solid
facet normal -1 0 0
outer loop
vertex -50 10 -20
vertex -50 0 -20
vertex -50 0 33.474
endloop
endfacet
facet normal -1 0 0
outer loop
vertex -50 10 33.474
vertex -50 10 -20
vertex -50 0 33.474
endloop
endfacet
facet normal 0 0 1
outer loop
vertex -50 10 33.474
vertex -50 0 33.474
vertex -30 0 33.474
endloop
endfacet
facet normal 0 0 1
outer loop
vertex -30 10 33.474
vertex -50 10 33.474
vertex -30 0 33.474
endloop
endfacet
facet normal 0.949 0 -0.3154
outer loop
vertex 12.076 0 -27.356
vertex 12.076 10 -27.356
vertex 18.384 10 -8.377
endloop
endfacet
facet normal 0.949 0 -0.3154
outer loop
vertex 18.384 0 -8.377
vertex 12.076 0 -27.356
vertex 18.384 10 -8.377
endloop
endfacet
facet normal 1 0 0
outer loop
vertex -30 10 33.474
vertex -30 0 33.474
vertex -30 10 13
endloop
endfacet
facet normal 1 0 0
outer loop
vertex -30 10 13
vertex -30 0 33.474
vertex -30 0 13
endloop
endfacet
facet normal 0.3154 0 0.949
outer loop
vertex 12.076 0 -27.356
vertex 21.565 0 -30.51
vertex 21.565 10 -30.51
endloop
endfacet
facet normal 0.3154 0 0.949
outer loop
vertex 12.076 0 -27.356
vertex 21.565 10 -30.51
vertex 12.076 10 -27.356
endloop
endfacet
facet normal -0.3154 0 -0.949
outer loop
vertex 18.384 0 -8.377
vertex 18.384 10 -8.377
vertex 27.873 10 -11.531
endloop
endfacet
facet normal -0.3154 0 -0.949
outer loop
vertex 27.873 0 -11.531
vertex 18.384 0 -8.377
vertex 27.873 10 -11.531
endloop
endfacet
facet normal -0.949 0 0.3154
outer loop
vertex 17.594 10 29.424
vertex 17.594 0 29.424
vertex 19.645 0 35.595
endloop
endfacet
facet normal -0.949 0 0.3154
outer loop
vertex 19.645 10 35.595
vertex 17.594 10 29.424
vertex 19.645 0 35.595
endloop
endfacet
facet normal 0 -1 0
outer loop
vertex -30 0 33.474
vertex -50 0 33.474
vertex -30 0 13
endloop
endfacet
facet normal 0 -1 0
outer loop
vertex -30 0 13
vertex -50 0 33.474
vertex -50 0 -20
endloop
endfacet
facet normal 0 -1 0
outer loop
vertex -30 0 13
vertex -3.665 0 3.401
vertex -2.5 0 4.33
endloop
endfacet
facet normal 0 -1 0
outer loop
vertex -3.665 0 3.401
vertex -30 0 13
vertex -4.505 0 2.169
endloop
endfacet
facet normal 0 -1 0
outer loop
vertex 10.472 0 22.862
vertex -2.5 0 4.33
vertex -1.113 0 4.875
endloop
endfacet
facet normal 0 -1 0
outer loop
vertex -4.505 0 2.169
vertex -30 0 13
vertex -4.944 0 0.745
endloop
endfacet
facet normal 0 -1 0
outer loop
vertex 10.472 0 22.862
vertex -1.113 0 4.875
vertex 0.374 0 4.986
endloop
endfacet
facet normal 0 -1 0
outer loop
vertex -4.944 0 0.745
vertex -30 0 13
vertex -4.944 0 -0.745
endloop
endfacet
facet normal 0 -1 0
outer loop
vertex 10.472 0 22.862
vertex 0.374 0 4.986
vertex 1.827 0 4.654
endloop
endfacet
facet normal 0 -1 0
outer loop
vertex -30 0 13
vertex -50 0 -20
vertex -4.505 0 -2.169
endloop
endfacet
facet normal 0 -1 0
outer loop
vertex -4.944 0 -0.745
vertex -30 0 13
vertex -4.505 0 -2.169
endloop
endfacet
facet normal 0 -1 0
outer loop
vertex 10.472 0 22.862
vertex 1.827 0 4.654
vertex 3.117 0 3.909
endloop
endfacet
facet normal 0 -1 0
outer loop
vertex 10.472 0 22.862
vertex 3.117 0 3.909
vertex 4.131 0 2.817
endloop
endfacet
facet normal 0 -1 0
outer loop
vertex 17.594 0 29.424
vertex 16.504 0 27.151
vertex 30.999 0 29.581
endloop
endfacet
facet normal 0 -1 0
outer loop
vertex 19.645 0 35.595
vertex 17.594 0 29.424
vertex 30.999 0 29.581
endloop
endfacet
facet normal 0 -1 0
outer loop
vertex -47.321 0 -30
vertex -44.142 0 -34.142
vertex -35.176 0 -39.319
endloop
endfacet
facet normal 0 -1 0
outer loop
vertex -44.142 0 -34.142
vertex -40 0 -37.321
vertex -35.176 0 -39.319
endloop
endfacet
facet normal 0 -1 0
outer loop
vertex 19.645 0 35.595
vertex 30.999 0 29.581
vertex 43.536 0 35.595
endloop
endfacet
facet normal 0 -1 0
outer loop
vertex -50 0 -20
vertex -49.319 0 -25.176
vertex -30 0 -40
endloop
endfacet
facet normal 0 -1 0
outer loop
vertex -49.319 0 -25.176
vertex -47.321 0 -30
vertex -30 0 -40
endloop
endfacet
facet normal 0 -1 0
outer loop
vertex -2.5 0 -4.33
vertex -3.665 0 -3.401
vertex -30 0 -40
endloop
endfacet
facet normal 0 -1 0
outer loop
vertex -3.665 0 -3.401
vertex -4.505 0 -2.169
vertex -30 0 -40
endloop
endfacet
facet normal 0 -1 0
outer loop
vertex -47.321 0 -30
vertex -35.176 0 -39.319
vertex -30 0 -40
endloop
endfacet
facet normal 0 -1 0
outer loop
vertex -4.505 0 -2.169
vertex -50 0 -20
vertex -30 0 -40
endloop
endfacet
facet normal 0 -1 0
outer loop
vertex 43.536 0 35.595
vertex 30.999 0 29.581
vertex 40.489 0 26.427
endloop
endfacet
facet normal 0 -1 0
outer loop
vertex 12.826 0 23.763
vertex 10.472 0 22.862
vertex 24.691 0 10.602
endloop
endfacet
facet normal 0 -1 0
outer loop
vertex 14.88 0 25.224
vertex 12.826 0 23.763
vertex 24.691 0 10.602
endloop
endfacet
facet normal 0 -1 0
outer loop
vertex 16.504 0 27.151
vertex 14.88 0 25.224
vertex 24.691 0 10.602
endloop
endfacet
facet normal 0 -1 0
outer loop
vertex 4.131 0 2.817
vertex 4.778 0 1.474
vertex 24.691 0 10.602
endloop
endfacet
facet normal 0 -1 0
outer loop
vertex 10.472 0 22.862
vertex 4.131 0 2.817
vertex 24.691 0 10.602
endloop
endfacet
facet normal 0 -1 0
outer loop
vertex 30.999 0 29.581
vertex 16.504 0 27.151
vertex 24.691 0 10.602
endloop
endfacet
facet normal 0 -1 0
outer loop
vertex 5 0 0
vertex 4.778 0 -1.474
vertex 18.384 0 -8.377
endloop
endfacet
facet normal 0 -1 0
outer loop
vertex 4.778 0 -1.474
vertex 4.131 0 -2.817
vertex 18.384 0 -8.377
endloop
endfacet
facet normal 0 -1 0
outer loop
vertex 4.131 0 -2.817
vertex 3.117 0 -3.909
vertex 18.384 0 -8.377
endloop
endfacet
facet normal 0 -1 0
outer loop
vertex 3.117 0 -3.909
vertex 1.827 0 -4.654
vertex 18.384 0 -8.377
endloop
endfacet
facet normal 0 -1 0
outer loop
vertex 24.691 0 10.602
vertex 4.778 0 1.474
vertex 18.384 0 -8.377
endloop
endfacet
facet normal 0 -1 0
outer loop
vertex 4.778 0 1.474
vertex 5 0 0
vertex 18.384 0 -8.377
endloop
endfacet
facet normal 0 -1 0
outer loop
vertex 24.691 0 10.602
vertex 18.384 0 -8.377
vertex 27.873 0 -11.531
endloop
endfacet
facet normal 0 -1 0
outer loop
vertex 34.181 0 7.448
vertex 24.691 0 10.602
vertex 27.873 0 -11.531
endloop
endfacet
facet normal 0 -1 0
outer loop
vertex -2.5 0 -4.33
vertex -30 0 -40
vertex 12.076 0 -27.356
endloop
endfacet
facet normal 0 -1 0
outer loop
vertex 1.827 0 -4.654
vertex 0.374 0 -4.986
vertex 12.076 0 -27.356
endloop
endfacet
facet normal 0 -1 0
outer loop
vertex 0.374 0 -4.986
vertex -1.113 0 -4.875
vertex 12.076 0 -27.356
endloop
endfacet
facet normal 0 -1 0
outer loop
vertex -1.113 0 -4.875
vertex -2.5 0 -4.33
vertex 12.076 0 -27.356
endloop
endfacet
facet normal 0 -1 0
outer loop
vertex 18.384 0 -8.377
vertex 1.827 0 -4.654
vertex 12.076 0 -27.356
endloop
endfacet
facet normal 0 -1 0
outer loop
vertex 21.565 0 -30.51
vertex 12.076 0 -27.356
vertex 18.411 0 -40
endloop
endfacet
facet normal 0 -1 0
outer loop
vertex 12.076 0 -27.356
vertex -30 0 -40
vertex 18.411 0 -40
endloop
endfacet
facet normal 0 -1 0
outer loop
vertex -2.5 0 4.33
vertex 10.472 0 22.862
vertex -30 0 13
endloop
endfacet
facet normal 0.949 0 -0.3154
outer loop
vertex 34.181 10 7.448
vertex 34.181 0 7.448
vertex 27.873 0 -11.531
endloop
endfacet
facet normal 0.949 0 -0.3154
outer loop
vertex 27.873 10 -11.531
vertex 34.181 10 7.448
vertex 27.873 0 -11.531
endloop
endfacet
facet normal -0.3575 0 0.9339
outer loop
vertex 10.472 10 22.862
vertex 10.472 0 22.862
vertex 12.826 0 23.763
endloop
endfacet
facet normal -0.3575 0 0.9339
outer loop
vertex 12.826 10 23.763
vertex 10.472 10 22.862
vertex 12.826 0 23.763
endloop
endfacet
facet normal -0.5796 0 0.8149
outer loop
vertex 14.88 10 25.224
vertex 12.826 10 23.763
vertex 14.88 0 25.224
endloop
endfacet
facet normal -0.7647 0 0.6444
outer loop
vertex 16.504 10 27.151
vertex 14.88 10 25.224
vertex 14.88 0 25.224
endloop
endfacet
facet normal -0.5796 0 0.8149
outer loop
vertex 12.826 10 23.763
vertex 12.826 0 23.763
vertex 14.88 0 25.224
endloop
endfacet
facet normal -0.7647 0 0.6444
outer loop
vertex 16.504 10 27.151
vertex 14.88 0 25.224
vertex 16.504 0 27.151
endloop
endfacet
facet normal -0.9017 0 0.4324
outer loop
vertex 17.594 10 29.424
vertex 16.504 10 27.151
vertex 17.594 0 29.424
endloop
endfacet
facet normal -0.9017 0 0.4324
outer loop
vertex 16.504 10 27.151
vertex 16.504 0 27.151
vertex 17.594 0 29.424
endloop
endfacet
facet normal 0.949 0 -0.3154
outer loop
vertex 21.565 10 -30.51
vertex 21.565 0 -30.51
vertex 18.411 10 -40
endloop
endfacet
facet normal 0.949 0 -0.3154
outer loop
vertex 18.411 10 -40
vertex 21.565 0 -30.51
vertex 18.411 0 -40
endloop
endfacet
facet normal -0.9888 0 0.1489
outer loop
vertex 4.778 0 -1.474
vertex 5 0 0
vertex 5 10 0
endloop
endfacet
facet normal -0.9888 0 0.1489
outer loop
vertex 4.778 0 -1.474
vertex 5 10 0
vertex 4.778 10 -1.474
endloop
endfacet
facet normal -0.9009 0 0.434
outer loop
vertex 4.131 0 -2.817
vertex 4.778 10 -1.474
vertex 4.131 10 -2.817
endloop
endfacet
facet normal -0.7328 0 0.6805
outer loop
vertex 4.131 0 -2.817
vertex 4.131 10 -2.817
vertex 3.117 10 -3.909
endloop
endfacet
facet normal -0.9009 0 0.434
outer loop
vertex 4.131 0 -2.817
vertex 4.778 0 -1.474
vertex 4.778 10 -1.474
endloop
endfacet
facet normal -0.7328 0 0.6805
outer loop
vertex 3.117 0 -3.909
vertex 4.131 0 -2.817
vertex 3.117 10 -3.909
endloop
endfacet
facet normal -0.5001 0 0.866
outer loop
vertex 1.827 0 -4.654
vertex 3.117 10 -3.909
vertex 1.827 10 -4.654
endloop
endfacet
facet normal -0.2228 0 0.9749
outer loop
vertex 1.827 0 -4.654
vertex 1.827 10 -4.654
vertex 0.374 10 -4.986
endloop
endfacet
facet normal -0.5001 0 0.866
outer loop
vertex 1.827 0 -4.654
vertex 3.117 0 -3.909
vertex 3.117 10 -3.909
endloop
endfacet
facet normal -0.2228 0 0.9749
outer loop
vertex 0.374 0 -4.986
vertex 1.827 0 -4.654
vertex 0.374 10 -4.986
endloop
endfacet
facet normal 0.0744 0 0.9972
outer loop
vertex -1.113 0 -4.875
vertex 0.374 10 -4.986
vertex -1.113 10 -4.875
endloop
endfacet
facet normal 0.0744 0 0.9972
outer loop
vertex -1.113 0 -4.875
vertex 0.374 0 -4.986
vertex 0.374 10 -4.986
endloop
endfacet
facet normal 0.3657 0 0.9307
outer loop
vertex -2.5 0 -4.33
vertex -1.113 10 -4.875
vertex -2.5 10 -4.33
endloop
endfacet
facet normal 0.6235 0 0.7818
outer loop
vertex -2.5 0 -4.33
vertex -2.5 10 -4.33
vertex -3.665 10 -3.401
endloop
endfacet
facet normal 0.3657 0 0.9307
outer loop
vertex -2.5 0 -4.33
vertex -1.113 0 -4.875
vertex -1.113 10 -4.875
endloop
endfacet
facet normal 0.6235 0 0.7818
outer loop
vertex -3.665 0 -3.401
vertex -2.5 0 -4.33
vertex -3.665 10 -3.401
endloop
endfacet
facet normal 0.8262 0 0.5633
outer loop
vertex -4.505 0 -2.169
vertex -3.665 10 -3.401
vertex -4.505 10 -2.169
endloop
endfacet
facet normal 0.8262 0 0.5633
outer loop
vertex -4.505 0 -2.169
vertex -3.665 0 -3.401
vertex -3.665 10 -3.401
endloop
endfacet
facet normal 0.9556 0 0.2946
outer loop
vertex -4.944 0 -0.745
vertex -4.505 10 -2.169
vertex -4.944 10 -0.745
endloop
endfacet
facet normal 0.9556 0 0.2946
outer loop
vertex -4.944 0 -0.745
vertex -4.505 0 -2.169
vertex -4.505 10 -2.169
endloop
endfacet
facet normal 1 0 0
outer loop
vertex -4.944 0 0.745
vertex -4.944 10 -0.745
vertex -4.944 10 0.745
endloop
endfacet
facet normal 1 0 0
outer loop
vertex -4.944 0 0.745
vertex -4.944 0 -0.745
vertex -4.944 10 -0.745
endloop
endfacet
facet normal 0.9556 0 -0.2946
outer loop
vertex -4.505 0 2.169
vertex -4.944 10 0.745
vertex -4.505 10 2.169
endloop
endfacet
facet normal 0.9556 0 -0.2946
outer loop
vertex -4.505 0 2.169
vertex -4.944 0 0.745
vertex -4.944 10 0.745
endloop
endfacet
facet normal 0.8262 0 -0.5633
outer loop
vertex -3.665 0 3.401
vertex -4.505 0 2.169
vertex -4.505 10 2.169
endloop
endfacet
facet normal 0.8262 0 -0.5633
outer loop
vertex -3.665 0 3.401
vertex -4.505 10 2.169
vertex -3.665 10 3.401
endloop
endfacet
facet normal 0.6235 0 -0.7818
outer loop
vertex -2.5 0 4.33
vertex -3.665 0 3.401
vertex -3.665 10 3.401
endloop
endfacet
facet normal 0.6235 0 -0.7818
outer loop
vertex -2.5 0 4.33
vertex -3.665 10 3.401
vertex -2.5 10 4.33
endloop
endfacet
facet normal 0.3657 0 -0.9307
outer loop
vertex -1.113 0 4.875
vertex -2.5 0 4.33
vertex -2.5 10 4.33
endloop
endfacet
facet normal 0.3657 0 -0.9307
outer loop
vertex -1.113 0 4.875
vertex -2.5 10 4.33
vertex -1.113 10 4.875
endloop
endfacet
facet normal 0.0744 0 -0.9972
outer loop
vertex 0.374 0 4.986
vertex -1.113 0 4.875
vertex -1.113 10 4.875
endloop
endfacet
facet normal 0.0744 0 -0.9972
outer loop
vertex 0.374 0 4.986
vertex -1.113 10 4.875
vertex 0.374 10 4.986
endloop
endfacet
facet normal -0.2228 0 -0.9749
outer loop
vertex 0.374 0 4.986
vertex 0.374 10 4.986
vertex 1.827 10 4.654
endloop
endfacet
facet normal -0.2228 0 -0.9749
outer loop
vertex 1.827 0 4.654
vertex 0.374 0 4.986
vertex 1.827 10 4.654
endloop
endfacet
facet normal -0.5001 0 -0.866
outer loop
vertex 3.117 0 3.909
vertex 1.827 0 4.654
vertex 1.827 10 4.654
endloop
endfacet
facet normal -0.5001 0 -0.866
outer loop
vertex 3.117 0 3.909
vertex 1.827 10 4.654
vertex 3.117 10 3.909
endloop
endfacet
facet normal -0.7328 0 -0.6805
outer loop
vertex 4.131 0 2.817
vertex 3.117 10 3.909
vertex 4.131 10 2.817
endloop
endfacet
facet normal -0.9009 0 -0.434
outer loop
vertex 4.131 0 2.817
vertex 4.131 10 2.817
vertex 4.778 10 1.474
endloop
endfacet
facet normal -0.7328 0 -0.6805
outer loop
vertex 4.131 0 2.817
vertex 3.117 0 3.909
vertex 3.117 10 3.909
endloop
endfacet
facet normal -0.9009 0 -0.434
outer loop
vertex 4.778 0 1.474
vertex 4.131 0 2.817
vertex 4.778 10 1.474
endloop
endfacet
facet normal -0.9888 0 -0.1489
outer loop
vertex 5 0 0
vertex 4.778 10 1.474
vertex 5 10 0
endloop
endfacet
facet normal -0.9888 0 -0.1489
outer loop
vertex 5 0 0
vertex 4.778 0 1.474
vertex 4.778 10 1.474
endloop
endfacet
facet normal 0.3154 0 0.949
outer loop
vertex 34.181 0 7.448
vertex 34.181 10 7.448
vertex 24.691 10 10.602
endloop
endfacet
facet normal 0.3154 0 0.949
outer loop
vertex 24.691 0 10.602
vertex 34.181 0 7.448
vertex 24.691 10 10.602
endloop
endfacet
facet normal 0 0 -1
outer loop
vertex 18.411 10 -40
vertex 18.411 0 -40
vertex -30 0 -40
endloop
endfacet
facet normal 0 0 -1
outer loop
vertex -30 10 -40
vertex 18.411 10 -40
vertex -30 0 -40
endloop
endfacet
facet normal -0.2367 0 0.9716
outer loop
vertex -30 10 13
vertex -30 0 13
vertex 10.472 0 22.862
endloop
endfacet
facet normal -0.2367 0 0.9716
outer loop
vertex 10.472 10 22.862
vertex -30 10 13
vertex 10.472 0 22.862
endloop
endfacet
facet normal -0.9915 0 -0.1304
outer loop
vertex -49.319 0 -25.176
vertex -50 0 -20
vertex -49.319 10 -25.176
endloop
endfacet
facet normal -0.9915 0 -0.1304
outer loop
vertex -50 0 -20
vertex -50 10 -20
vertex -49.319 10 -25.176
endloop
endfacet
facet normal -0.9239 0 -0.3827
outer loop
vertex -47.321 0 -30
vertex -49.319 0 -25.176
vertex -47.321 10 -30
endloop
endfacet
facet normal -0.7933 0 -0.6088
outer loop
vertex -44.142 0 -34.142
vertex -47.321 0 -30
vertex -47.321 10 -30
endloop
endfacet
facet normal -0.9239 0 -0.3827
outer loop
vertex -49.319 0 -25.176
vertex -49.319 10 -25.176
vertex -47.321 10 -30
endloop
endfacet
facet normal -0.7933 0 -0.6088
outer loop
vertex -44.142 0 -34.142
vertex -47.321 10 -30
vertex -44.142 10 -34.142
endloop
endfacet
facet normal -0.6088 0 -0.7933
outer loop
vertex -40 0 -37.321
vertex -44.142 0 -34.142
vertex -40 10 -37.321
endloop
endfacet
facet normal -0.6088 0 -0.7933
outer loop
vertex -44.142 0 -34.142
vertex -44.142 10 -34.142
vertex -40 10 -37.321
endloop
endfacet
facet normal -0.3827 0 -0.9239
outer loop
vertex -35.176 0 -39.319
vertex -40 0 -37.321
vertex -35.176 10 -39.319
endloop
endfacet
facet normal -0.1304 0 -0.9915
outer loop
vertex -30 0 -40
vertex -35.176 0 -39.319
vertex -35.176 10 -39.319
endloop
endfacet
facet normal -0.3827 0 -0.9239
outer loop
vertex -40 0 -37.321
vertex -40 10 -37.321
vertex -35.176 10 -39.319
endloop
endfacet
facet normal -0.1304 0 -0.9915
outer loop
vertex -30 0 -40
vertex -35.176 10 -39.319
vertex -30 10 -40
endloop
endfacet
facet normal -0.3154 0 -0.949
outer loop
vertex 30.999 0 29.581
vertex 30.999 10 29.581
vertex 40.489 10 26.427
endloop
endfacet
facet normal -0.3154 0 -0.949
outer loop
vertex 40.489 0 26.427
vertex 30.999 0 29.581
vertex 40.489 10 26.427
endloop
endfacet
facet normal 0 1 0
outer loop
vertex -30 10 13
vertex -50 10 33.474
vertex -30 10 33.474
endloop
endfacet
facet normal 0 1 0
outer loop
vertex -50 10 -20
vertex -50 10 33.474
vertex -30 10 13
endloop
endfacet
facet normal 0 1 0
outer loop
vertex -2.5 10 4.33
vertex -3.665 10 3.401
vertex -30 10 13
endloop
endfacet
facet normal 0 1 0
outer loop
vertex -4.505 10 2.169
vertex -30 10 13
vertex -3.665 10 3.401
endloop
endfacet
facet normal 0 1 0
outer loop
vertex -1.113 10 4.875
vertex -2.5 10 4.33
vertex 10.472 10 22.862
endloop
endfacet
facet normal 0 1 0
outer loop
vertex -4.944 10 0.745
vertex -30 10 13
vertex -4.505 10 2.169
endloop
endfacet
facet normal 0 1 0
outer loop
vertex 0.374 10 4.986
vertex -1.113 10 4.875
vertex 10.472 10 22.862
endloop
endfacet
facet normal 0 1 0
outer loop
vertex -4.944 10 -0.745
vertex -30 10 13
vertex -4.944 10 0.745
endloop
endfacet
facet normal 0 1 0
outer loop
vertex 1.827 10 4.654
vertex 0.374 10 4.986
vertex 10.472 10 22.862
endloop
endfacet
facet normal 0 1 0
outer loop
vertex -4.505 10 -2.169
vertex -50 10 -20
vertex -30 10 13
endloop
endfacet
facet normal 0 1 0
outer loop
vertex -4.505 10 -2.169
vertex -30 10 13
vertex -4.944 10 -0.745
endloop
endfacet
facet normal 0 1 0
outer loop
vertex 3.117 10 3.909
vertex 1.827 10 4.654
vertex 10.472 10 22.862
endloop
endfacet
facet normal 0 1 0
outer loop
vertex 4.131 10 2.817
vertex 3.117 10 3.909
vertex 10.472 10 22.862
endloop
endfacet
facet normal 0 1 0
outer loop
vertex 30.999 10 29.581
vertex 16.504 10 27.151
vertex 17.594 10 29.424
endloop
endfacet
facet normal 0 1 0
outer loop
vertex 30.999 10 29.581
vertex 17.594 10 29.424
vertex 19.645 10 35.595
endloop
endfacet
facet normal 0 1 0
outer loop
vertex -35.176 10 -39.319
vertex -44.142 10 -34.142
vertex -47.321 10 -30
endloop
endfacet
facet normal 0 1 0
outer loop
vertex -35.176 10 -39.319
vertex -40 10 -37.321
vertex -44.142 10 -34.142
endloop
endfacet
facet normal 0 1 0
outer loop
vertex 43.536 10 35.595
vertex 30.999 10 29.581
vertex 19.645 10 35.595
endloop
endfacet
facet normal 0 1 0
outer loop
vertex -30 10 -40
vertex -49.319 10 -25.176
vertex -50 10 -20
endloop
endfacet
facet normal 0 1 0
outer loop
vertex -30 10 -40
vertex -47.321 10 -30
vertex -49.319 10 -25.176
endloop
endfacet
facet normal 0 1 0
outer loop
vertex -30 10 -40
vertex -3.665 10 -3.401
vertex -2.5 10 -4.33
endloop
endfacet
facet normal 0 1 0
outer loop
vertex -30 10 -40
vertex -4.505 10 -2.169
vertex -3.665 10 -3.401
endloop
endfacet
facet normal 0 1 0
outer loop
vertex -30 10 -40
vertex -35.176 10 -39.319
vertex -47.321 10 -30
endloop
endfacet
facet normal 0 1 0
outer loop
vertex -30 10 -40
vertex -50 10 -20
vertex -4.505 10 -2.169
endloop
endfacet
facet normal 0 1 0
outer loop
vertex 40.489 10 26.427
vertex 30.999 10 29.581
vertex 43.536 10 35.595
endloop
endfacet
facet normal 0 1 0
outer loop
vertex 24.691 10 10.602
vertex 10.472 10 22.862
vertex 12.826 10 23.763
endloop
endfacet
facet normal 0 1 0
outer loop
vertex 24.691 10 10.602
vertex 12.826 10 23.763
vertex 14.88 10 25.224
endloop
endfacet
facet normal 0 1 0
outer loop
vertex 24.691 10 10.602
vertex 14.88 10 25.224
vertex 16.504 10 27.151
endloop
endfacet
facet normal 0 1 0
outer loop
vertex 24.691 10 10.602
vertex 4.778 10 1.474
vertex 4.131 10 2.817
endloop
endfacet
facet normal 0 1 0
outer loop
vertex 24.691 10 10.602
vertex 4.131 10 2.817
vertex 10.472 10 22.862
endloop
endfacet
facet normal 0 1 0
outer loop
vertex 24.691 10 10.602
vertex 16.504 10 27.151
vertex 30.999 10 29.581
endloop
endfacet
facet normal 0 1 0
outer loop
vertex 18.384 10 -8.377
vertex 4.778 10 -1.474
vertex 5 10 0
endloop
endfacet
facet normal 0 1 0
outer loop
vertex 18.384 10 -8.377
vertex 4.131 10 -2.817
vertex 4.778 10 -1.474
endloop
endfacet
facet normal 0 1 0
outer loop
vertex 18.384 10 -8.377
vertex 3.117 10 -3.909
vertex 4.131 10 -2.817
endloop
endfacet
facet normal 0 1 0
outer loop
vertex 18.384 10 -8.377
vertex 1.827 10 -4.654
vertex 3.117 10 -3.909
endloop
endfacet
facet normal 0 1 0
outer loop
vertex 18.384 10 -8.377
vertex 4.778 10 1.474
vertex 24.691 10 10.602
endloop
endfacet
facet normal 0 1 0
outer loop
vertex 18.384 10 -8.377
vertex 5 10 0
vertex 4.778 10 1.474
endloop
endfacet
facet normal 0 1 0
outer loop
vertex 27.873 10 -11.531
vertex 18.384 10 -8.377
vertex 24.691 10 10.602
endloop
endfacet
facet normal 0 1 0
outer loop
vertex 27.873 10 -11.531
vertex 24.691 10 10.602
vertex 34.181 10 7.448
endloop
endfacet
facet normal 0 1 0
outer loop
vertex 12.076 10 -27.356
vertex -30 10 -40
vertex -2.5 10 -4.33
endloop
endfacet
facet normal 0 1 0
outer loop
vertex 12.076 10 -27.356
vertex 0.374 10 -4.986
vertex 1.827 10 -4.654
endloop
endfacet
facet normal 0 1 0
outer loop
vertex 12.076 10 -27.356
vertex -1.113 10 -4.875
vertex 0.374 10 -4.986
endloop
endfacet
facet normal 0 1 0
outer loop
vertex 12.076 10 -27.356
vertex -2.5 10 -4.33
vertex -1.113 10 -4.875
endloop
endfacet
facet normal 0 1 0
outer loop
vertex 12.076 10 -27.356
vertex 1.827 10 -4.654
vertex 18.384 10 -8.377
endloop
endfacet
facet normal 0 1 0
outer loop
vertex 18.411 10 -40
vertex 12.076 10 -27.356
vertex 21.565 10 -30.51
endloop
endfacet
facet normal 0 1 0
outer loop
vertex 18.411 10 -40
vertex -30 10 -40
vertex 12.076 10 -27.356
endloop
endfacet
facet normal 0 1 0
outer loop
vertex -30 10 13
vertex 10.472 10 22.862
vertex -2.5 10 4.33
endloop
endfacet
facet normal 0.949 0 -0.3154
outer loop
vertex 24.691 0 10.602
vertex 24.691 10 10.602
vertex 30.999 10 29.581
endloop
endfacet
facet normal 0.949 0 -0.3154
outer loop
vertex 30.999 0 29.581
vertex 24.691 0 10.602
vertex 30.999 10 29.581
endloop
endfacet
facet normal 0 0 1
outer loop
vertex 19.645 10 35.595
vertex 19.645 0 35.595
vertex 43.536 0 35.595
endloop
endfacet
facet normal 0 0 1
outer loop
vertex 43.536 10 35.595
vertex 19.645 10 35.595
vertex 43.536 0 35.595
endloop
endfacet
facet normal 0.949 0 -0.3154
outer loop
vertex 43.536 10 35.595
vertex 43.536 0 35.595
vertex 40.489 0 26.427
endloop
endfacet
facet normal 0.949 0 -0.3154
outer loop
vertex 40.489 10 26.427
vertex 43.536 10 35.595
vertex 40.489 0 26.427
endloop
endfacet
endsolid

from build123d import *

# Parameters (mm, degrees)
SKETCH1_R           = 5
BOSS_EXTRUDE1_DEPTH = 10
CUT_EXTRUDE1_DEPTH  = 10
FILLET1_R           = 20


with BuildPart() as part:
    # Sketch1 → Boss-Extrude1 (new body)
    with BuildSketch(Plane(origin=(0, 0, 0), x_dir=(1, 0, 0), z_dir=(0, 1, 0))):
        with BuildLine():
            Line((43.536010052, -35.595148029), (18.411320837, 40))
            Line((18.411320837, 40), (-50, 40))
            Line((-50, 40), (-50, -13))
            Line((-50, -13), (-50, -33.474160509))
            Line((-50, -33.474160509), (-30, -33.474160509))
            Line((-30, -33.474160509), (-30, -13))
            Line((-30, -13), (10.471929596, -22.862355971))
            ThreePointArc((10.471929596, -22.862355971), (14.880225334, -25.223606168), (17.593976856, -29.424097387))
            Line((17.593976856, -29.424097387), (19.644977926, -35.595148029))
            Line((19.644977926, -35.595148029), (43.536010052, -35.595148029))
        make_face()
        Circle(SKETCH1_R, mode=Mode.SUBTRACT)
    extrude(amount=BOSS_EXTRUDE1_DEPTH)

    # Sketch2 → Cut-Extrude1 (cut)
    with BuildSketch(Plane(origin=(0, 10, 0), x_dir=(1, 0, 0), z_dir=(0, 1, 0))):
        Polygon((21.565271485, 30.510395408), (12.075666894, 27.35644476), (18.38356819, 8.377235576), (27.873172782, 11.531186225), align=None)
        Polygon((34.181074079, -7.448022959), (24.691469487, -10.601973607), (30.999370784, -29.581182791), (40.488975376, -26.427232142), align=None)
    extrude(amount=-CUT_EXTRUDE1_DEPTH, mode=Mode.SUBTRACT)

    # Fillet1
    fillet1_edges = [part.edges().sort_by_distance(p)[0] for p in [
        (-50, 5, -40),
    ]]
    fillet(fillet1_edges, radius=FILLET1_R)


solid = part.part
